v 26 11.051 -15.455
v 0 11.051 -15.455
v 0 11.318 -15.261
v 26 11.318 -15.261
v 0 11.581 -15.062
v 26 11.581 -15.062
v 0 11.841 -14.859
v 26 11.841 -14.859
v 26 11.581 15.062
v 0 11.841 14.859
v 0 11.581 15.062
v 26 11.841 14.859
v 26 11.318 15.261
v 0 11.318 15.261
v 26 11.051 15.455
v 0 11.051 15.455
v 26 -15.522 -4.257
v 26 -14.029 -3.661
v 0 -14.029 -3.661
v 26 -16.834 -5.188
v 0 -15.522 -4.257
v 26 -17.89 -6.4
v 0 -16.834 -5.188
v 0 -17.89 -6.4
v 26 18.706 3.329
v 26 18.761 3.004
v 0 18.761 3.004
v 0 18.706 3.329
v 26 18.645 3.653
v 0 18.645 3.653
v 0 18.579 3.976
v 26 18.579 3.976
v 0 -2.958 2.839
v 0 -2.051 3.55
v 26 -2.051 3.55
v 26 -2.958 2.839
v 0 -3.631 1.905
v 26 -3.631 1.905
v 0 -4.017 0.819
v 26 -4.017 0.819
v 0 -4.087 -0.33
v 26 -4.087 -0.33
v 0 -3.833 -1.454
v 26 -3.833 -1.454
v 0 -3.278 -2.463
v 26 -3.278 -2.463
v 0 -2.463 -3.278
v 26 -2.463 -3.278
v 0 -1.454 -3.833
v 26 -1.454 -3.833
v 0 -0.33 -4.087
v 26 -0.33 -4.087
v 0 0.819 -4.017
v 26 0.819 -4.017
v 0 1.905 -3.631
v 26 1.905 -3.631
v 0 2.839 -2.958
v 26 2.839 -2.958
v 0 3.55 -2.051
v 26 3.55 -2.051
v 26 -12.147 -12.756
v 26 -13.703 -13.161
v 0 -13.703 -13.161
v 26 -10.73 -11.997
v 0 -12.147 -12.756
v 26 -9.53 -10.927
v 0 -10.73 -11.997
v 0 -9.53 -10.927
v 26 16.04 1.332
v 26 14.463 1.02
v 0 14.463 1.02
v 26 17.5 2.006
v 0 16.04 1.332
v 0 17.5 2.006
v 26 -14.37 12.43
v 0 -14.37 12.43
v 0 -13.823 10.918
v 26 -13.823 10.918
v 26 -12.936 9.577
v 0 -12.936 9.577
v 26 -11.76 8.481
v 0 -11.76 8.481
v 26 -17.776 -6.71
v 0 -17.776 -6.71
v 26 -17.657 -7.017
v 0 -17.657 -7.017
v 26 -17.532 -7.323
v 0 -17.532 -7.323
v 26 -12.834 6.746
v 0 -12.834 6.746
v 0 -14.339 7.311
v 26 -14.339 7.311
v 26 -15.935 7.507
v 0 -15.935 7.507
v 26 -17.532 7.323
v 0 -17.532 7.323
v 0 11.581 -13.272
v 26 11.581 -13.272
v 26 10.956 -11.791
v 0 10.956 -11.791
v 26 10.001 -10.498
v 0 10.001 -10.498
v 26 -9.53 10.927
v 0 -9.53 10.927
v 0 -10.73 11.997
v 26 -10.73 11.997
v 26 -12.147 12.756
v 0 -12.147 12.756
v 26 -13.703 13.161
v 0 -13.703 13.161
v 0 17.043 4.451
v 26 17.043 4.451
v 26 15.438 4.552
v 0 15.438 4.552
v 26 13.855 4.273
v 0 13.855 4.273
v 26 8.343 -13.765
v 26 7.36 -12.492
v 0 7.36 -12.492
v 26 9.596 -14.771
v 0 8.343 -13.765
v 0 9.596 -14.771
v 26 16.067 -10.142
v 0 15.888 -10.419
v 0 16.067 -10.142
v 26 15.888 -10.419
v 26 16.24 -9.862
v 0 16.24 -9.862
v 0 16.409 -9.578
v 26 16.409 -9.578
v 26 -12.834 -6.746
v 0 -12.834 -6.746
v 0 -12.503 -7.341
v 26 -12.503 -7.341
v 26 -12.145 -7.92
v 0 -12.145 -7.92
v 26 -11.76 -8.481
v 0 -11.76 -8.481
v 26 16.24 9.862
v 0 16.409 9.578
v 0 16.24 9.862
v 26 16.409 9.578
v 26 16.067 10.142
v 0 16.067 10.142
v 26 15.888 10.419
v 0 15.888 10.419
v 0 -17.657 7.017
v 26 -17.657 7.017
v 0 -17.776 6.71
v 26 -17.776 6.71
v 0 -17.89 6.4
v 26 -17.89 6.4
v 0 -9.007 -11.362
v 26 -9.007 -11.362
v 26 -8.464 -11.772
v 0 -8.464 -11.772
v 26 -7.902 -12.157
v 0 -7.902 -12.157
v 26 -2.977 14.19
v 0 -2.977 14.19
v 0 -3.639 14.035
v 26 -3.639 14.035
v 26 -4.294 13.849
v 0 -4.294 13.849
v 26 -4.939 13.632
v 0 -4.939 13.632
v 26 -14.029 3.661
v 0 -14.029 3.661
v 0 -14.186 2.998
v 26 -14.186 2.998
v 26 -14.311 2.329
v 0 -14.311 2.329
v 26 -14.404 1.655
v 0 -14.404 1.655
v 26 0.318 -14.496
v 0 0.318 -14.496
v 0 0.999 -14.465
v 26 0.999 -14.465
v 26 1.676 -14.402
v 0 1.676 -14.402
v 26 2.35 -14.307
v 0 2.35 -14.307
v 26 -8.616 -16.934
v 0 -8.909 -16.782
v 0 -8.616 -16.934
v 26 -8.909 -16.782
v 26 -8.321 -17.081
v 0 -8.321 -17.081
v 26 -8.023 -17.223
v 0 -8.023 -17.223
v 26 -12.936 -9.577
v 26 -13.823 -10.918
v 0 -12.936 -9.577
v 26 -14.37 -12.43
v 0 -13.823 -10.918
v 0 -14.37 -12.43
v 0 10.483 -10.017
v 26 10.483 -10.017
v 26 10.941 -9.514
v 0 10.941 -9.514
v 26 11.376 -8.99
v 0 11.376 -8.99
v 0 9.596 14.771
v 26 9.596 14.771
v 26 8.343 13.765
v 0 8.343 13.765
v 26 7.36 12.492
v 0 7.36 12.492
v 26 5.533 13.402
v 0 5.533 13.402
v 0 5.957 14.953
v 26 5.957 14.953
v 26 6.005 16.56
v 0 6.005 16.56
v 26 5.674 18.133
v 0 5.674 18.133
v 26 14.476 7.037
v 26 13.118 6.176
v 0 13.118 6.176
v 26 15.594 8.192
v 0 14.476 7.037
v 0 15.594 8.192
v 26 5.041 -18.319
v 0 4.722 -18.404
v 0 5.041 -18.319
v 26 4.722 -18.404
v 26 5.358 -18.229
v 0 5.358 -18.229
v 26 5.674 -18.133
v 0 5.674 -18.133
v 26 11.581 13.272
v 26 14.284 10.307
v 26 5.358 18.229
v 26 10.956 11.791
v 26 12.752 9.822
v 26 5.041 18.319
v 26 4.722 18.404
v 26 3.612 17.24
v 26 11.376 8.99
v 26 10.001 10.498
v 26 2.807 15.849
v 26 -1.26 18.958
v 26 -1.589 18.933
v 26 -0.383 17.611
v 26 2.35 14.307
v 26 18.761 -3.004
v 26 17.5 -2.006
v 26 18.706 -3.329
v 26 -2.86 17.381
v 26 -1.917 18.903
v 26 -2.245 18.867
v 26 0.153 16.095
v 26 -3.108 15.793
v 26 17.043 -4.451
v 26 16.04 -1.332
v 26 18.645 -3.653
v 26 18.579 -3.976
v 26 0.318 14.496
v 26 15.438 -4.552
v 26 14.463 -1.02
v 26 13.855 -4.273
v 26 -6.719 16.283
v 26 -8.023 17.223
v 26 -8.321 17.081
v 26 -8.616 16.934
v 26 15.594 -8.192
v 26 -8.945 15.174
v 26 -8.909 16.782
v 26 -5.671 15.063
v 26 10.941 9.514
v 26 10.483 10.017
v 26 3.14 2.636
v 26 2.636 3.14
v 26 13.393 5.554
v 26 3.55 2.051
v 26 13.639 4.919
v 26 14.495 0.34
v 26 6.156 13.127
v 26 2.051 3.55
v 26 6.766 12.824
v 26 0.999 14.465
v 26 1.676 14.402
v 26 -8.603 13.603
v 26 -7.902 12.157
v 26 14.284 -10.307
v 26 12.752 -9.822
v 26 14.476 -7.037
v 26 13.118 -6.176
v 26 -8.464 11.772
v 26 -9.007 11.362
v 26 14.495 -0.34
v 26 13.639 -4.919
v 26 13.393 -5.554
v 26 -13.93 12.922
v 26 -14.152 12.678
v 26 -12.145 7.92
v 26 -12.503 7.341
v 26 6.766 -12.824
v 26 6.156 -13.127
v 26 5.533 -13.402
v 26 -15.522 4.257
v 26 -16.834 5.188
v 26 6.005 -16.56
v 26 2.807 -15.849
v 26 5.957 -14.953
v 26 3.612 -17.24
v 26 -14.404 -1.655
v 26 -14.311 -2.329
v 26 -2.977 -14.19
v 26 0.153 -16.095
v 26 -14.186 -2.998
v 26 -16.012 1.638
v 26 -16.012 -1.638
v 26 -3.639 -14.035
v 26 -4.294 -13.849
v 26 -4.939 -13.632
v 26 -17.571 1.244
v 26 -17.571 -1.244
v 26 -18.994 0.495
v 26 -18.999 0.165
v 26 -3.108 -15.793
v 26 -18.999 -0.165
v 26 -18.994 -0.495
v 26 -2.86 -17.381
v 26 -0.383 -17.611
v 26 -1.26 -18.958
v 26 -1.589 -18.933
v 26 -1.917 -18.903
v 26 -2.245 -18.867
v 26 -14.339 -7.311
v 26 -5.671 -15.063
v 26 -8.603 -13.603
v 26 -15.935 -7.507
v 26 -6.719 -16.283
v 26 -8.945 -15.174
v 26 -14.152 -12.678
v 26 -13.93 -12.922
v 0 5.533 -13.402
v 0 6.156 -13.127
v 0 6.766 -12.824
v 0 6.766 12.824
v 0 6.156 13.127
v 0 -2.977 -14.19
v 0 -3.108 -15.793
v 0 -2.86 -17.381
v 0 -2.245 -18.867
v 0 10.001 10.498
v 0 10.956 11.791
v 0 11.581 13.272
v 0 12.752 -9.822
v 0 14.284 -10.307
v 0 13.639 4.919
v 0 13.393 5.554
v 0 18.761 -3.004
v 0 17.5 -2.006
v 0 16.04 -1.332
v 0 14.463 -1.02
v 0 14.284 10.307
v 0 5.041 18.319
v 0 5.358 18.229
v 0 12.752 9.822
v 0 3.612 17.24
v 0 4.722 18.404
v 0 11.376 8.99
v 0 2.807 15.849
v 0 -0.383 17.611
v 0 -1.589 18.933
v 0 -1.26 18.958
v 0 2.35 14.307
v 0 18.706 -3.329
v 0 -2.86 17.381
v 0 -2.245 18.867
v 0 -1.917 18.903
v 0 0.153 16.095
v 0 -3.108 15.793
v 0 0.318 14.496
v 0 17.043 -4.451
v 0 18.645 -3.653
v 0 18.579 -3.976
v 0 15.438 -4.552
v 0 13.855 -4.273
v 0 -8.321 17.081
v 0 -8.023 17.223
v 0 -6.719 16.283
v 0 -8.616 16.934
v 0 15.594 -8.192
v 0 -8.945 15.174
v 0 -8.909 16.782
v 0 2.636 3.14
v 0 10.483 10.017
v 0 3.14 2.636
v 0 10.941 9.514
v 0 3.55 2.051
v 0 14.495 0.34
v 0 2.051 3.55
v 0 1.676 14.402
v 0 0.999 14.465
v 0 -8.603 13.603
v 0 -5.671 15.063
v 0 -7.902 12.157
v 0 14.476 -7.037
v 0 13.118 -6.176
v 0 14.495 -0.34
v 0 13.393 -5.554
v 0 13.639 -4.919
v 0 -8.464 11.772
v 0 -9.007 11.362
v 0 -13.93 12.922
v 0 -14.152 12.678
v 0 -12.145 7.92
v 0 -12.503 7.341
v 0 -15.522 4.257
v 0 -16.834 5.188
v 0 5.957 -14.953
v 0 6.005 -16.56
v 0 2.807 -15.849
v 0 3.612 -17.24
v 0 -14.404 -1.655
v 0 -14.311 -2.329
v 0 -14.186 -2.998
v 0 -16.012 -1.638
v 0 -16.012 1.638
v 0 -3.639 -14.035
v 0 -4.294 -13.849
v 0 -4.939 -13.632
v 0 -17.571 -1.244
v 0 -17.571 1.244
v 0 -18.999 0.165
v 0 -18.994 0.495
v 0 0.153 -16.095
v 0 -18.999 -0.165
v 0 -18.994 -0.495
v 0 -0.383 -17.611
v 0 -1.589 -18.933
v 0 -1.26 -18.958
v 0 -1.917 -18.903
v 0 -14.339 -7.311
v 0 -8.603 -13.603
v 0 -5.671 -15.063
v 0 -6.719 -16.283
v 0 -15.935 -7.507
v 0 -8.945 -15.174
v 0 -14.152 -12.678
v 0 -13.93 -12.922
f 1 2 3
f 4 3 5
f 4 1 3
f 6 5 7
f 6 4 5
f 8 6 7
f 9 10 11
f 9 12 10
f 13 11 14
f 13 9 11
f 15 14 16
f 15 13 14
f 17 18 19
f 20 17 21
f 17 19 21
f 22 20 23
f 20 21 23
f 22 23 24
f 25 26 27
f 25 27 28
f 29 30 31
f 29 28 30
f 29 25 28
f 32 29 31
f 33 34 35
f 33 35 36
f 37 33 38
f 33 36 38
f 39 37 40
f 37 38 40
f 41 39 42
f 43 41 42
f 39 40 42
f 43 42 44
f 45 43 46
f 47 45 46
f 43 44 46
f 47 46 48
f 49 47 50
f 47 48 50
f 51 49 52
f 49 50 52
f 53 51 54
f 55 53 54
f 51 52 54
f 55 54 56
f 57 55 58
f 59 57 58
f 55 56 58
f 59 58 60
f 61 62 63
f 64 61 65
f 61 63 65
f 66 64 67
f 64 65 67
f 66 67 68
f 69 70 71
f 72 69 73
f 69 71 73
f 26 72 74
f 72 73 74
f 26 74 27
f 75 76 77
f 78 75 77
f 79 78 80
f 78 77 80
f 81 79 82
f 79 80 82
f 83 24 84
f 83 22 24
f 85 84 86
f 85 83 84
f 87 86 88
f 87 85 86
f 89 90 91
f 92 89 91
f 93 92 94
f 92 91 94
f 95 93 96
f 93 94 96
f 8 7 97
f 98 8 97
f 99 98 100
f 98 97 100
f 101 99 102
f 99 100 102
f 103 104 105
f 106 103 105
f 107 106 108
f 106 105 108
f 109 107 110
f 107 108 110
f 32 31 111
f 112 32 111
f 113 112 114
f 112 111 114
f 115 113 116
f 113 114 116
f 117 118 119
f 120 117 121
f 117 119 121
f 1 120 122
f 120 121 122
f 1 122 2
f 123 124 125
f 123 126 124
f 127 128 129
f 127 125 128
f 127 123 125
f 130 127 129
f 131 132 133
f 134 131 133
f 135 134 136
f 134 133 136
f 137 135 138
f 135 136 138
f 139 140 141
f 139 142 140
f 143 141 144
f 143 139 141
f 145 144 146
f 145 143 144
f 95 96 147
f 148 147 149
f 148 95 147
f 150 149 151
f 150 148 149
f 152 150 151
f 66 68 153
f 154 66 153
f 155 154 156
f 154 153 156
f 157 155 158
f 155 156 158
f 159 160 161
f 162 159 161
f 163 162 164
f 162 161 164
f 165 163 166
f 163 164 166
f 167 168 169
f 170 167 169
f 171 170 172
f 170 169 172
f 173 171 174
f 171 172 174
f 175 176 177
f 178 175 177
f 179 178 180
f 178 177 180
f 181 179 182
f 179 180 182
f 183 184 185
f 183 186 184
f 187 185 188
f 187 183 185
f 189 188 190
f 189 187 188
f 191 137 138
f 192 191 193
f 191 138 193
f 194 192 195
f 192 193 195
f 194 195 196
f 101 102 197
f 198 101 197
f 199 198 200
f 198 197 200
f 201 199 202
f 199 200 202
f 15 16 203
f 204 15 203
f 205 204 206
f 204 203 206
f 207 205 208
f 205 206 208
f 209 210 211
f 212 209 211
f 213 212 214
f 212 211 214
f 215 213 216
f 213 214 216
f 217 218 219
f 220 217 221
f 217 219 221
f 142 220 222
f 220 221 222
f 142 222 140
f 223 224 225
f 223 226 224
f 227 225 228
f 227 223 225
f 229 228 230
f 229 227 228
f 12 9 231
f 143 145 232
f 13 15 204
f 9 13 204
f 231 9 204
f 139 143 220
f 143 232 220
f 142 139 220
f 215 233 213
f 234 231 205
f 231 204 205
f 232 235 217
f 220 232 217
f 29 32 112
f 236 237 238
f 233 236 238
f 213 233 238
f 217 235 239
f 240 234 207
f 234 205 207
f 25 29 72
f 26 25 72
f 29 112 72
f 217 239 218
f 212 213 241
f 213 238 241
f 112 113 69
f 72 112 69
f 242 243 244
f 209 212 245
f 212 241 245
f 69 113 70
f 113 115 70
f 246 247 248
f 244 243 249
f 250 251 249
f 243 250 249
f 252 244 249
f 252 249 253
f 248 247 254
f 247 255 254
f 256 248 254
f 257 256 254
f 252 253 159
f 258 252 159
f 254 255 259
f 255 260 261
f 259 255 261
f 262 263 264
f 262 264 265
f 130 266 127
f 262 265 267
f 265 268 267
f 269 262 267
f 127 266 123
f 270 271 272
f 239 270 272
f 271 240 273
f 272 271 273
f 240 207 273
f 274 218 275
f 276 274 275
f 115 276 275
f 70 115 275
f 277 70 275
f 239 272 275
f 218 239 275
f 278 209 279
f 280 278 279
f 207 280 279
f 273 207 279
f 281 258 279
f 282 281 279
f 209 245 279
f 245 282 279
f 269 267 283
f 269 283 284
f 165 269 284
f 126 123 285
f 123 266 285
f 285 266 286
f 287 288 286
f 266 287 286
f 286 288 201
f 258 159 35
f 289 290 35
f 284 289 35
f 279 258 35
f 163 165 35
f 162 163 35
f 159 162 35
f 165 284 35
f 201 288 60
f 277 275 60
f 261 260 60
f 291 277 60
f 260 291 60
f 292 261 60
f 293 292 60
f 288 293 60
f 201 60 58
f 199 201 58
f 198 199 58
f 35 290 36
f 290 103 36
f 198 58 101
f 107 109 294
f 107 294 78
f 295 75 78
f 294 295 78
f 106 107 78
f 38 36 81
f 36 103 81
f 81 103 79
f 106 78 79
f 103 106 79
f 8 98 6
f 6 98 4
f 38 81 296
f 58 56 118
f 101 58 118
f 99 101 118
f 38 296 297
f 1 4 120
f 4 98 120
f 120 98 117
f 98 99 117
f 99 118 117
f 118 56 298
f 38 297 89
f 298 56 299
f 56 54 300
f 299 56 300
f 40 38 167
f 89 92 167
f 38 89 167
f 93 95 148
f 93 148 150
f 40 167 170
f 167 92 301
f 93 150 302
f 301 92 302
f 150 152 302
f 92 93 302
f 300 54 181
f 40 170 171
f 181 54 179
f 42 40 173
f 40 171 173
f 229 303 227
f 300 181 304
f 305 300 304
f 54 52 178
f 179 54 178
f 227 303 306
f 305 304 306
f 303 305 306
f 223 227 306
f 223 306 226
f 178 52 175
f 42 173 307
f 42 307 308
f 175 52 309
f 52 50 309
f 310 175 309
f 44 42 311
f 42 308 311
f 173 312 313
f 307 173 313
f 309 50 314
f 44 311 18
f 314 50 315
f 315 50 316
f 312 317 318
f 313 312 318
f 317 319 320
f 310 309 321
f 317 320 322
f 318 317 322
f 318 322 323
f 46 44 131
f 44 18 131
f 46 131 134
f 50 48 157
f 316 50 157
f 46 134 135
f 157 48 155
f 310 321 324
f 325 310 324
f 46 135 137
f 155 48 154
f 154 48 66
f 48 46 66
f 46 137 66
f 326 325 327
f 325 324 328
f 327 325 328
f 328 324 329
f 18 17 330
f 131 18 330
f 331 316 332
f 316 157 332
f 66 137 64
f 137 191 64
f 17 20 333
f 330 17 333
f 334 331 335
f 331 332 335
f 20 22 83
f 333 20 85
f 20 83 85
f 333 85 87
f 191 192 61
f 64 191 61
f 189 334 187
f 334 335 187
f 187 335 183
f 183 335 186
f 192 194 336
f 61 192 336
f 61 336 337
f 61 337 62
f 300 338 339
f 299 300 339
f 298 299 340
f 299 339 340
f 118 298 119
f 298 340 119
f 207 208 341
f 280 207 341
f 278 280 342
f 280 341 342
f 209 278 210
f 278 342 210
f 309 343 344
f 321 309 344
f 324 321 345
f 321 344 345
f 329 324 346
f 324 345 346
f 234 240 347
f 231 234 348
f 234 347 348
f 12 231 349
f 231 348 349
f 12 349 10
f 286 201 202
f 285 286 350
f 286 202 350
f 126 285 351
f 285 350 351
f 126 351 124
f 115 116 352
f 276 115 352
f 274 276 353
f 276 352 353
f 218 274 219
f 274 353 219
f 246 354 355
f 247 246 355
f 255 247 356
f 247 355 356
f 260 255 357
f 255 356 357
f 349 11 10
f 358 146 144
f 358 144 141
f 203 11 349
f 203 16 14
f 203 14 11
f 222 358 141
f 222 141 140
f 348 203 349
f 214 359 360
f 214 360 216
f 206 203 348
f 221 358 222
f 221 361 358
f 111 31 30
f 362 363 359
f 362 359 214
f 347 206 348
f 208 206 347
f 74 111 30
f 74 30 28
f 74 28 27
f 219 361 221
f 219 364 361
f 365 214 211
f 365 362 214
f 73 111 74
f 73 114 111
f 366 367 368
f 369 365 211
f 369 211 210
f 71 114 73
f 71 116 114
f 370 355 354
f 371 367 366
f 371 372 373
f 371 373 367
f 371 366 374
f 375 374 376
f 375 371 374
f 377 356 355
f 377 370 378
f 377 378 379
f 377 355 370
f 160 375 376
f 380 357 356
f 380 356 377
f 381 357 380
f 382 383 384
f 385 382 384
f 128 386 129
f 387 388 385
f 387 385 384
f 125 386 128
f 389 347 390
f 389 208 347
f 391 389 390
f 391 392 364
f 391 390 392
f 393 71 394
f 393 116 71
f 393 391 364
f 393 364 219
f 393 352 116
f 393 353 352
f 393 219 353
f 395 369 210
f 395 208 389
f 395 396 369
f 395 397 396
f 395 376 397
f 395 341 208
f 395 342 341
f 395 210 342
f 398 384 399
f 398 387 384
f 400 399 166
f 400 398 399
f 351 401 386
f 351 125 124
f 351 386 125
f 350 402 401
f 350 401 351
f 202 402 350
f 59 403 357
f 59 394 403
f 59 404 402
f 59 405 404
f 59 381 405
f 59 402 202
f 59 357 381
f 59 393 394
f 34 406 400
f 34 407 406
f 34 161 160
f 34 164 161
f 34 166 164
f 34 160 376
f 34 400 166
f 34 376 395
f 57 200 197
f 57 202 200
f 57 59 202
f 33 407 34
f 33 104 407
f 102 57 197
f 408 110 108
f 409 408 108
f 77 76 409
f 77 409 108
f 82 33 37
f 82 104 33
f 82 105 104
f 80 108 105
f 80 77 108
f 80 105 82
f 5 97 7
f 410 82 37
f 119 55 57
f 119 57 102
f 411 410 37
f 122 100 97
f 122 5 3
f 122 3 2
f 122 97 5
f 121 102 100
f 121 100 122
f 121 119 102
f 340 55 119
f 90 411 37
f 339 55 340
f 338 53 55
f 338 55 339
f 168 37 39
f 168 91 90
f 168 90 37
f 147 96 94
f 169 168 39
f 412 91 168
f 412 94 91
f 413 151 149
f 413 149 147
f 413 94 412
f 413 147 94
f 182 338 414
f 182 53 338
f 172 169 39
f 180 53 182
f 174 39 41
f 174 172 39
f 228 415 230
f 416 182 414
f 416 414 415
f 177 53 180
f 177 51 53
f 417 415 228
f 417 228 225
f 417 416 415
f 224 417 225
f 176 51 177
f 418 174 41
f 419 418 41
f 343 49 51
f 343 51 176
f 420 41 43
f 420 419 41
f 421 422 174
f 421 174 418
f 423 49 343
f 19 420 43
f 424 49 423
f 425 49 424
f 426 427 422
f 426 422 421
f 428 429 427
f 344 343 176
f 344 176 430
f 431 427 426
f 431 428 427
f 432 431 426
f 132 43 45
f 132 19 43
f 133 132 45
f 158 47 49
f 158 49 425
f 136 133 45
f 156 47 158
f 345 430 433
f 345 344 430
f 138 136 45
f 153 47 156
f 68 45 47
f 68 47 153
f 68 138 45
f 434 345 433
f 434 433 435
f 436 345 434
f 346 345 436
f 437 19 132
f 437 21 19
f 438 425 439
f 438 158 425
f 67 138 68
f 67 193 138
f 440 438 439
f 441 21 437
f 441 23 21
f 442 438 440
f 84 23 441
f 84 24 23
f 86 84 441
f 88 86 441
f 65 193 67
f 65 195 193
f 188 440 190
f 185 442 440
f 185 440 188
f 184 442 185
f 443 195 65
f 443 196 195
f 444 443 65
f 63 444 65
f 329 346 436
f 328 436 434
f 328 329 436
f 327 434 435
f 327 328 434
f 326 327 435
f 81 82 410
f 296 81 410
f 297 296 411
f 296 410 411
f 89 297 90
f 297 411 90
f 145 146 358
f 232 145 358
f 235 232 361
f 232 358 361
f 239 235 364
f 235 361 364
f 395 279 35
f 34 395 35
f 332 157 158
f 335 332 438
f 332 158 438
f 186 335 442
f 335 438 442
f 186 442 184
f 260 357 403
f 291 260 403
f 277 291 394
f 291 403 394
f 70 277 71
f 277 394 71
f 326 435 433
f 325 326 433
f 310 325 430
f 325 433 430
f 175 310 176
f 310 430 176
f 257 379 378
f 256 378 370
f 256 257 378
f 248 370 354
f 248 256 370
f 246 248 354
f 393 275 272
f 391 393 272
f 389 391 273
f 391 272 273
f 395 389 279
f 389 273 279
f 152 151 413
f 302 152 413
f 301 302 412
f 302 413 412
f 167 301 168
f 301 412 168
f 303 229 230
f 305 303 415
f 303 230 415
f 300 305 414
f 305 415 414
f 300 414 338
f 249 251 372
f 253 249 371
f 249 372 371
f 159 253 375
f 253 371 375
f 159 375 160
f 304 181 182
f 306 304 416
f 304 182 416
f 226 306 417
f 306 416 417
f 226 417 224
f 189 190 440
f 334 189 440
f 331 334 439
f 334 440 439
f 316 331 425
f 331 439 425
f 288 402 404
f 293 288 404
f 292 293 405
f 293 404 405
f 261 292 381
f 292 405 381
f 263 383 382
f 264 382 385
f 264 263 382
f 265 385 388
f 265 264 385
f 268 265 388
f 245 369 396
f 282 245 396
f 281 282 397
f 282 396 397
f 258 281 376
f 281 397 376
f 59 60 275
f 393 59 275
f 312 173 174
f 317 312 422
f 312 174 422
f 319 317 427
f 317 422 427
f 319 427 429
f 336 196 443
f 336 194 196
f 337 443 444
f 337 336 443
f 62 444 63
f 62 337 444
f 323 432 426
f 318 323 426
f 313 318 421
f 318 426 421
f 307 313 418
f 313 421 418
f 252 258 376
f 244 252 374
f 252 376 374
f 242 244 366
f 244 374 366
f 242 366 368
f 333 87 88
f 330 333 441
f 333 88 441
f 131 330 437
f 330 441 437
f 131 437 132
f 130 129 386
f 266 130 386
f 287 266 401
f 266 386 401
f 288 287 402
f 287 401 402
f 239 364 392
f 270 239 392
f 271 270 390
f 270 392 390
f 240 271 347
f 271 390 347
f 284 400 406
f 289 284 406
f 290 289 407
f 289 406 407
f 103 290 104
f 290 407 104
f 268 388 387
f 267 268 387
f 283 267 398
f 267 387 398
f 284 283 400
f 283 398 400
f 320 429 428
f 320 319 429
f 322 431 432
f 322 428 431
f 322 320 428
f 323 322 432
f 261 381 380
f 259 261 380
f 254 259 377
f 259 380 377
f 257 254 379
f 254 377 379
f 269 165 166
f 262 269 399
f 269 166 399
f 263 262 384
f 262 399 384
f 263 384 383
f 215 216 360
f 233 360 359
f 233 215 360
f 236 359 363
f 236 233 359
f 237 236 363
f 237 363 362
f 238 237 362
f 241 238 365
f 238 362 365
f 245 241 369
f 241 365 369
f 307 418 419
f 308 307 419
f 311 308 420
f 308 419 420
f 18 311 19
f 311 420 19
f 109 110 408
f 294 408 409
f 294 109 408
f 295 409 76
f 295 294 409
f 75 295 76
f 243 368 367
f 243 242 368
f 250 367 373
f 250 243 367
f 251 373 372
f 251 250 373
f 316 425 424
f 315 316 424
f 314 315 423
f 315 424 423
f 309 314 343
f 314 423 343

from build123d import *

# Parameters (mm, degrees)
BASPROSKE_W     = 26
BASPROSKE_H     = 19
TOOTHCUT_DEPTH  = 38.389838192
TEETHCUTS_COUNT = 17
TEETHCUTS_ANGLE = 338.823529412
BORE_DEPTH      = 50.0000508


with BuildPart() as part:
    # BasProSke → Base-Revolve (revolve)
    with BuildSketch(Plane(origin=(0, 0, 0), x_dir=(1, 0, 0), z_dir=(0, 1, 0)), mode=Mode.PRIVATE) as base_revolve_sk:
        with Locations((13, 9.5)):
            Rectangle(BASPROSKE_W, BASPROSKE_H)
    revolve(base_revolve_sk.sketch.rotate(Axis((-10, 0, 0), (1, 0, 0)), 180), axis=Axis((-10, 0, 0), (1, 0, 0)))

    # TooCutSke → ToothCut (cut, through all)
    with BuildSketch(Plane(origin=(0, 0, 0), x_dir=(0, 0, -1), z_dir=(1, 0, 0))):
        with BuildLine():
            ThreePointArc((1.020352389, 14.463052306), (0, 14.499), (-1.020352389, 14.463052306))
            ThreePointArc((-1.020352389, 14.463052306), (-1.632621885, 16.804485203), (-3.026143023, 18.783192049))
            ThreePointArc((-3.026143023, 18.783192049), (0, 19.0254), (3.026143023, 18.783192049))
            ThreePointArc((3.026143023, 18.783192049), (1.632621885, 16.804485203), (1.020352389, 14.463052306))
        make_face()
    toothcut = extrude(amount=TOOTHCUT_DEPTH, mode=Mode.SUBTRACT)

    # TeethCuts: ToothCut ×17 about axis
    teethcuts_axis = Axis((-10, 0, 0), (1, 0, 0))
    for i in range(1, TEETHCUTS_COUNT):
        add(toothcut.rotate(teethcuts_axis, i * TEETHCUTS_ANGLE / (TEETHCUTS_COUNT - 1)), mode=Mode.SUBTRACT)

    # BorSke → Bore (cut, symmetric)
    with BuildSketch(Plane(origin=(0, 0, 0), x_dir=(0, 0, -1), z_dir=(1, 0, 0))):
        with BuildLine():
            Line((-3.55, 2.05121915), (-3.55, -2.05121915))
            ThreePointArc((-3.55, -2.05121915), (2.899137803, -2.899137803), (2.05121915, 3.55))
            Line((2.05121915, 3.55), (-2.05121915, 3.55))
            ThreePointArc((-2.05121915, 3.55), (-2.899137803, 2.899137803), (-3.55, 2.05121915))
        make_face()
    extrude(amount=BORE_DEPTH, both=True, mode=Mode.SUBTRACT)


solid = part.part
